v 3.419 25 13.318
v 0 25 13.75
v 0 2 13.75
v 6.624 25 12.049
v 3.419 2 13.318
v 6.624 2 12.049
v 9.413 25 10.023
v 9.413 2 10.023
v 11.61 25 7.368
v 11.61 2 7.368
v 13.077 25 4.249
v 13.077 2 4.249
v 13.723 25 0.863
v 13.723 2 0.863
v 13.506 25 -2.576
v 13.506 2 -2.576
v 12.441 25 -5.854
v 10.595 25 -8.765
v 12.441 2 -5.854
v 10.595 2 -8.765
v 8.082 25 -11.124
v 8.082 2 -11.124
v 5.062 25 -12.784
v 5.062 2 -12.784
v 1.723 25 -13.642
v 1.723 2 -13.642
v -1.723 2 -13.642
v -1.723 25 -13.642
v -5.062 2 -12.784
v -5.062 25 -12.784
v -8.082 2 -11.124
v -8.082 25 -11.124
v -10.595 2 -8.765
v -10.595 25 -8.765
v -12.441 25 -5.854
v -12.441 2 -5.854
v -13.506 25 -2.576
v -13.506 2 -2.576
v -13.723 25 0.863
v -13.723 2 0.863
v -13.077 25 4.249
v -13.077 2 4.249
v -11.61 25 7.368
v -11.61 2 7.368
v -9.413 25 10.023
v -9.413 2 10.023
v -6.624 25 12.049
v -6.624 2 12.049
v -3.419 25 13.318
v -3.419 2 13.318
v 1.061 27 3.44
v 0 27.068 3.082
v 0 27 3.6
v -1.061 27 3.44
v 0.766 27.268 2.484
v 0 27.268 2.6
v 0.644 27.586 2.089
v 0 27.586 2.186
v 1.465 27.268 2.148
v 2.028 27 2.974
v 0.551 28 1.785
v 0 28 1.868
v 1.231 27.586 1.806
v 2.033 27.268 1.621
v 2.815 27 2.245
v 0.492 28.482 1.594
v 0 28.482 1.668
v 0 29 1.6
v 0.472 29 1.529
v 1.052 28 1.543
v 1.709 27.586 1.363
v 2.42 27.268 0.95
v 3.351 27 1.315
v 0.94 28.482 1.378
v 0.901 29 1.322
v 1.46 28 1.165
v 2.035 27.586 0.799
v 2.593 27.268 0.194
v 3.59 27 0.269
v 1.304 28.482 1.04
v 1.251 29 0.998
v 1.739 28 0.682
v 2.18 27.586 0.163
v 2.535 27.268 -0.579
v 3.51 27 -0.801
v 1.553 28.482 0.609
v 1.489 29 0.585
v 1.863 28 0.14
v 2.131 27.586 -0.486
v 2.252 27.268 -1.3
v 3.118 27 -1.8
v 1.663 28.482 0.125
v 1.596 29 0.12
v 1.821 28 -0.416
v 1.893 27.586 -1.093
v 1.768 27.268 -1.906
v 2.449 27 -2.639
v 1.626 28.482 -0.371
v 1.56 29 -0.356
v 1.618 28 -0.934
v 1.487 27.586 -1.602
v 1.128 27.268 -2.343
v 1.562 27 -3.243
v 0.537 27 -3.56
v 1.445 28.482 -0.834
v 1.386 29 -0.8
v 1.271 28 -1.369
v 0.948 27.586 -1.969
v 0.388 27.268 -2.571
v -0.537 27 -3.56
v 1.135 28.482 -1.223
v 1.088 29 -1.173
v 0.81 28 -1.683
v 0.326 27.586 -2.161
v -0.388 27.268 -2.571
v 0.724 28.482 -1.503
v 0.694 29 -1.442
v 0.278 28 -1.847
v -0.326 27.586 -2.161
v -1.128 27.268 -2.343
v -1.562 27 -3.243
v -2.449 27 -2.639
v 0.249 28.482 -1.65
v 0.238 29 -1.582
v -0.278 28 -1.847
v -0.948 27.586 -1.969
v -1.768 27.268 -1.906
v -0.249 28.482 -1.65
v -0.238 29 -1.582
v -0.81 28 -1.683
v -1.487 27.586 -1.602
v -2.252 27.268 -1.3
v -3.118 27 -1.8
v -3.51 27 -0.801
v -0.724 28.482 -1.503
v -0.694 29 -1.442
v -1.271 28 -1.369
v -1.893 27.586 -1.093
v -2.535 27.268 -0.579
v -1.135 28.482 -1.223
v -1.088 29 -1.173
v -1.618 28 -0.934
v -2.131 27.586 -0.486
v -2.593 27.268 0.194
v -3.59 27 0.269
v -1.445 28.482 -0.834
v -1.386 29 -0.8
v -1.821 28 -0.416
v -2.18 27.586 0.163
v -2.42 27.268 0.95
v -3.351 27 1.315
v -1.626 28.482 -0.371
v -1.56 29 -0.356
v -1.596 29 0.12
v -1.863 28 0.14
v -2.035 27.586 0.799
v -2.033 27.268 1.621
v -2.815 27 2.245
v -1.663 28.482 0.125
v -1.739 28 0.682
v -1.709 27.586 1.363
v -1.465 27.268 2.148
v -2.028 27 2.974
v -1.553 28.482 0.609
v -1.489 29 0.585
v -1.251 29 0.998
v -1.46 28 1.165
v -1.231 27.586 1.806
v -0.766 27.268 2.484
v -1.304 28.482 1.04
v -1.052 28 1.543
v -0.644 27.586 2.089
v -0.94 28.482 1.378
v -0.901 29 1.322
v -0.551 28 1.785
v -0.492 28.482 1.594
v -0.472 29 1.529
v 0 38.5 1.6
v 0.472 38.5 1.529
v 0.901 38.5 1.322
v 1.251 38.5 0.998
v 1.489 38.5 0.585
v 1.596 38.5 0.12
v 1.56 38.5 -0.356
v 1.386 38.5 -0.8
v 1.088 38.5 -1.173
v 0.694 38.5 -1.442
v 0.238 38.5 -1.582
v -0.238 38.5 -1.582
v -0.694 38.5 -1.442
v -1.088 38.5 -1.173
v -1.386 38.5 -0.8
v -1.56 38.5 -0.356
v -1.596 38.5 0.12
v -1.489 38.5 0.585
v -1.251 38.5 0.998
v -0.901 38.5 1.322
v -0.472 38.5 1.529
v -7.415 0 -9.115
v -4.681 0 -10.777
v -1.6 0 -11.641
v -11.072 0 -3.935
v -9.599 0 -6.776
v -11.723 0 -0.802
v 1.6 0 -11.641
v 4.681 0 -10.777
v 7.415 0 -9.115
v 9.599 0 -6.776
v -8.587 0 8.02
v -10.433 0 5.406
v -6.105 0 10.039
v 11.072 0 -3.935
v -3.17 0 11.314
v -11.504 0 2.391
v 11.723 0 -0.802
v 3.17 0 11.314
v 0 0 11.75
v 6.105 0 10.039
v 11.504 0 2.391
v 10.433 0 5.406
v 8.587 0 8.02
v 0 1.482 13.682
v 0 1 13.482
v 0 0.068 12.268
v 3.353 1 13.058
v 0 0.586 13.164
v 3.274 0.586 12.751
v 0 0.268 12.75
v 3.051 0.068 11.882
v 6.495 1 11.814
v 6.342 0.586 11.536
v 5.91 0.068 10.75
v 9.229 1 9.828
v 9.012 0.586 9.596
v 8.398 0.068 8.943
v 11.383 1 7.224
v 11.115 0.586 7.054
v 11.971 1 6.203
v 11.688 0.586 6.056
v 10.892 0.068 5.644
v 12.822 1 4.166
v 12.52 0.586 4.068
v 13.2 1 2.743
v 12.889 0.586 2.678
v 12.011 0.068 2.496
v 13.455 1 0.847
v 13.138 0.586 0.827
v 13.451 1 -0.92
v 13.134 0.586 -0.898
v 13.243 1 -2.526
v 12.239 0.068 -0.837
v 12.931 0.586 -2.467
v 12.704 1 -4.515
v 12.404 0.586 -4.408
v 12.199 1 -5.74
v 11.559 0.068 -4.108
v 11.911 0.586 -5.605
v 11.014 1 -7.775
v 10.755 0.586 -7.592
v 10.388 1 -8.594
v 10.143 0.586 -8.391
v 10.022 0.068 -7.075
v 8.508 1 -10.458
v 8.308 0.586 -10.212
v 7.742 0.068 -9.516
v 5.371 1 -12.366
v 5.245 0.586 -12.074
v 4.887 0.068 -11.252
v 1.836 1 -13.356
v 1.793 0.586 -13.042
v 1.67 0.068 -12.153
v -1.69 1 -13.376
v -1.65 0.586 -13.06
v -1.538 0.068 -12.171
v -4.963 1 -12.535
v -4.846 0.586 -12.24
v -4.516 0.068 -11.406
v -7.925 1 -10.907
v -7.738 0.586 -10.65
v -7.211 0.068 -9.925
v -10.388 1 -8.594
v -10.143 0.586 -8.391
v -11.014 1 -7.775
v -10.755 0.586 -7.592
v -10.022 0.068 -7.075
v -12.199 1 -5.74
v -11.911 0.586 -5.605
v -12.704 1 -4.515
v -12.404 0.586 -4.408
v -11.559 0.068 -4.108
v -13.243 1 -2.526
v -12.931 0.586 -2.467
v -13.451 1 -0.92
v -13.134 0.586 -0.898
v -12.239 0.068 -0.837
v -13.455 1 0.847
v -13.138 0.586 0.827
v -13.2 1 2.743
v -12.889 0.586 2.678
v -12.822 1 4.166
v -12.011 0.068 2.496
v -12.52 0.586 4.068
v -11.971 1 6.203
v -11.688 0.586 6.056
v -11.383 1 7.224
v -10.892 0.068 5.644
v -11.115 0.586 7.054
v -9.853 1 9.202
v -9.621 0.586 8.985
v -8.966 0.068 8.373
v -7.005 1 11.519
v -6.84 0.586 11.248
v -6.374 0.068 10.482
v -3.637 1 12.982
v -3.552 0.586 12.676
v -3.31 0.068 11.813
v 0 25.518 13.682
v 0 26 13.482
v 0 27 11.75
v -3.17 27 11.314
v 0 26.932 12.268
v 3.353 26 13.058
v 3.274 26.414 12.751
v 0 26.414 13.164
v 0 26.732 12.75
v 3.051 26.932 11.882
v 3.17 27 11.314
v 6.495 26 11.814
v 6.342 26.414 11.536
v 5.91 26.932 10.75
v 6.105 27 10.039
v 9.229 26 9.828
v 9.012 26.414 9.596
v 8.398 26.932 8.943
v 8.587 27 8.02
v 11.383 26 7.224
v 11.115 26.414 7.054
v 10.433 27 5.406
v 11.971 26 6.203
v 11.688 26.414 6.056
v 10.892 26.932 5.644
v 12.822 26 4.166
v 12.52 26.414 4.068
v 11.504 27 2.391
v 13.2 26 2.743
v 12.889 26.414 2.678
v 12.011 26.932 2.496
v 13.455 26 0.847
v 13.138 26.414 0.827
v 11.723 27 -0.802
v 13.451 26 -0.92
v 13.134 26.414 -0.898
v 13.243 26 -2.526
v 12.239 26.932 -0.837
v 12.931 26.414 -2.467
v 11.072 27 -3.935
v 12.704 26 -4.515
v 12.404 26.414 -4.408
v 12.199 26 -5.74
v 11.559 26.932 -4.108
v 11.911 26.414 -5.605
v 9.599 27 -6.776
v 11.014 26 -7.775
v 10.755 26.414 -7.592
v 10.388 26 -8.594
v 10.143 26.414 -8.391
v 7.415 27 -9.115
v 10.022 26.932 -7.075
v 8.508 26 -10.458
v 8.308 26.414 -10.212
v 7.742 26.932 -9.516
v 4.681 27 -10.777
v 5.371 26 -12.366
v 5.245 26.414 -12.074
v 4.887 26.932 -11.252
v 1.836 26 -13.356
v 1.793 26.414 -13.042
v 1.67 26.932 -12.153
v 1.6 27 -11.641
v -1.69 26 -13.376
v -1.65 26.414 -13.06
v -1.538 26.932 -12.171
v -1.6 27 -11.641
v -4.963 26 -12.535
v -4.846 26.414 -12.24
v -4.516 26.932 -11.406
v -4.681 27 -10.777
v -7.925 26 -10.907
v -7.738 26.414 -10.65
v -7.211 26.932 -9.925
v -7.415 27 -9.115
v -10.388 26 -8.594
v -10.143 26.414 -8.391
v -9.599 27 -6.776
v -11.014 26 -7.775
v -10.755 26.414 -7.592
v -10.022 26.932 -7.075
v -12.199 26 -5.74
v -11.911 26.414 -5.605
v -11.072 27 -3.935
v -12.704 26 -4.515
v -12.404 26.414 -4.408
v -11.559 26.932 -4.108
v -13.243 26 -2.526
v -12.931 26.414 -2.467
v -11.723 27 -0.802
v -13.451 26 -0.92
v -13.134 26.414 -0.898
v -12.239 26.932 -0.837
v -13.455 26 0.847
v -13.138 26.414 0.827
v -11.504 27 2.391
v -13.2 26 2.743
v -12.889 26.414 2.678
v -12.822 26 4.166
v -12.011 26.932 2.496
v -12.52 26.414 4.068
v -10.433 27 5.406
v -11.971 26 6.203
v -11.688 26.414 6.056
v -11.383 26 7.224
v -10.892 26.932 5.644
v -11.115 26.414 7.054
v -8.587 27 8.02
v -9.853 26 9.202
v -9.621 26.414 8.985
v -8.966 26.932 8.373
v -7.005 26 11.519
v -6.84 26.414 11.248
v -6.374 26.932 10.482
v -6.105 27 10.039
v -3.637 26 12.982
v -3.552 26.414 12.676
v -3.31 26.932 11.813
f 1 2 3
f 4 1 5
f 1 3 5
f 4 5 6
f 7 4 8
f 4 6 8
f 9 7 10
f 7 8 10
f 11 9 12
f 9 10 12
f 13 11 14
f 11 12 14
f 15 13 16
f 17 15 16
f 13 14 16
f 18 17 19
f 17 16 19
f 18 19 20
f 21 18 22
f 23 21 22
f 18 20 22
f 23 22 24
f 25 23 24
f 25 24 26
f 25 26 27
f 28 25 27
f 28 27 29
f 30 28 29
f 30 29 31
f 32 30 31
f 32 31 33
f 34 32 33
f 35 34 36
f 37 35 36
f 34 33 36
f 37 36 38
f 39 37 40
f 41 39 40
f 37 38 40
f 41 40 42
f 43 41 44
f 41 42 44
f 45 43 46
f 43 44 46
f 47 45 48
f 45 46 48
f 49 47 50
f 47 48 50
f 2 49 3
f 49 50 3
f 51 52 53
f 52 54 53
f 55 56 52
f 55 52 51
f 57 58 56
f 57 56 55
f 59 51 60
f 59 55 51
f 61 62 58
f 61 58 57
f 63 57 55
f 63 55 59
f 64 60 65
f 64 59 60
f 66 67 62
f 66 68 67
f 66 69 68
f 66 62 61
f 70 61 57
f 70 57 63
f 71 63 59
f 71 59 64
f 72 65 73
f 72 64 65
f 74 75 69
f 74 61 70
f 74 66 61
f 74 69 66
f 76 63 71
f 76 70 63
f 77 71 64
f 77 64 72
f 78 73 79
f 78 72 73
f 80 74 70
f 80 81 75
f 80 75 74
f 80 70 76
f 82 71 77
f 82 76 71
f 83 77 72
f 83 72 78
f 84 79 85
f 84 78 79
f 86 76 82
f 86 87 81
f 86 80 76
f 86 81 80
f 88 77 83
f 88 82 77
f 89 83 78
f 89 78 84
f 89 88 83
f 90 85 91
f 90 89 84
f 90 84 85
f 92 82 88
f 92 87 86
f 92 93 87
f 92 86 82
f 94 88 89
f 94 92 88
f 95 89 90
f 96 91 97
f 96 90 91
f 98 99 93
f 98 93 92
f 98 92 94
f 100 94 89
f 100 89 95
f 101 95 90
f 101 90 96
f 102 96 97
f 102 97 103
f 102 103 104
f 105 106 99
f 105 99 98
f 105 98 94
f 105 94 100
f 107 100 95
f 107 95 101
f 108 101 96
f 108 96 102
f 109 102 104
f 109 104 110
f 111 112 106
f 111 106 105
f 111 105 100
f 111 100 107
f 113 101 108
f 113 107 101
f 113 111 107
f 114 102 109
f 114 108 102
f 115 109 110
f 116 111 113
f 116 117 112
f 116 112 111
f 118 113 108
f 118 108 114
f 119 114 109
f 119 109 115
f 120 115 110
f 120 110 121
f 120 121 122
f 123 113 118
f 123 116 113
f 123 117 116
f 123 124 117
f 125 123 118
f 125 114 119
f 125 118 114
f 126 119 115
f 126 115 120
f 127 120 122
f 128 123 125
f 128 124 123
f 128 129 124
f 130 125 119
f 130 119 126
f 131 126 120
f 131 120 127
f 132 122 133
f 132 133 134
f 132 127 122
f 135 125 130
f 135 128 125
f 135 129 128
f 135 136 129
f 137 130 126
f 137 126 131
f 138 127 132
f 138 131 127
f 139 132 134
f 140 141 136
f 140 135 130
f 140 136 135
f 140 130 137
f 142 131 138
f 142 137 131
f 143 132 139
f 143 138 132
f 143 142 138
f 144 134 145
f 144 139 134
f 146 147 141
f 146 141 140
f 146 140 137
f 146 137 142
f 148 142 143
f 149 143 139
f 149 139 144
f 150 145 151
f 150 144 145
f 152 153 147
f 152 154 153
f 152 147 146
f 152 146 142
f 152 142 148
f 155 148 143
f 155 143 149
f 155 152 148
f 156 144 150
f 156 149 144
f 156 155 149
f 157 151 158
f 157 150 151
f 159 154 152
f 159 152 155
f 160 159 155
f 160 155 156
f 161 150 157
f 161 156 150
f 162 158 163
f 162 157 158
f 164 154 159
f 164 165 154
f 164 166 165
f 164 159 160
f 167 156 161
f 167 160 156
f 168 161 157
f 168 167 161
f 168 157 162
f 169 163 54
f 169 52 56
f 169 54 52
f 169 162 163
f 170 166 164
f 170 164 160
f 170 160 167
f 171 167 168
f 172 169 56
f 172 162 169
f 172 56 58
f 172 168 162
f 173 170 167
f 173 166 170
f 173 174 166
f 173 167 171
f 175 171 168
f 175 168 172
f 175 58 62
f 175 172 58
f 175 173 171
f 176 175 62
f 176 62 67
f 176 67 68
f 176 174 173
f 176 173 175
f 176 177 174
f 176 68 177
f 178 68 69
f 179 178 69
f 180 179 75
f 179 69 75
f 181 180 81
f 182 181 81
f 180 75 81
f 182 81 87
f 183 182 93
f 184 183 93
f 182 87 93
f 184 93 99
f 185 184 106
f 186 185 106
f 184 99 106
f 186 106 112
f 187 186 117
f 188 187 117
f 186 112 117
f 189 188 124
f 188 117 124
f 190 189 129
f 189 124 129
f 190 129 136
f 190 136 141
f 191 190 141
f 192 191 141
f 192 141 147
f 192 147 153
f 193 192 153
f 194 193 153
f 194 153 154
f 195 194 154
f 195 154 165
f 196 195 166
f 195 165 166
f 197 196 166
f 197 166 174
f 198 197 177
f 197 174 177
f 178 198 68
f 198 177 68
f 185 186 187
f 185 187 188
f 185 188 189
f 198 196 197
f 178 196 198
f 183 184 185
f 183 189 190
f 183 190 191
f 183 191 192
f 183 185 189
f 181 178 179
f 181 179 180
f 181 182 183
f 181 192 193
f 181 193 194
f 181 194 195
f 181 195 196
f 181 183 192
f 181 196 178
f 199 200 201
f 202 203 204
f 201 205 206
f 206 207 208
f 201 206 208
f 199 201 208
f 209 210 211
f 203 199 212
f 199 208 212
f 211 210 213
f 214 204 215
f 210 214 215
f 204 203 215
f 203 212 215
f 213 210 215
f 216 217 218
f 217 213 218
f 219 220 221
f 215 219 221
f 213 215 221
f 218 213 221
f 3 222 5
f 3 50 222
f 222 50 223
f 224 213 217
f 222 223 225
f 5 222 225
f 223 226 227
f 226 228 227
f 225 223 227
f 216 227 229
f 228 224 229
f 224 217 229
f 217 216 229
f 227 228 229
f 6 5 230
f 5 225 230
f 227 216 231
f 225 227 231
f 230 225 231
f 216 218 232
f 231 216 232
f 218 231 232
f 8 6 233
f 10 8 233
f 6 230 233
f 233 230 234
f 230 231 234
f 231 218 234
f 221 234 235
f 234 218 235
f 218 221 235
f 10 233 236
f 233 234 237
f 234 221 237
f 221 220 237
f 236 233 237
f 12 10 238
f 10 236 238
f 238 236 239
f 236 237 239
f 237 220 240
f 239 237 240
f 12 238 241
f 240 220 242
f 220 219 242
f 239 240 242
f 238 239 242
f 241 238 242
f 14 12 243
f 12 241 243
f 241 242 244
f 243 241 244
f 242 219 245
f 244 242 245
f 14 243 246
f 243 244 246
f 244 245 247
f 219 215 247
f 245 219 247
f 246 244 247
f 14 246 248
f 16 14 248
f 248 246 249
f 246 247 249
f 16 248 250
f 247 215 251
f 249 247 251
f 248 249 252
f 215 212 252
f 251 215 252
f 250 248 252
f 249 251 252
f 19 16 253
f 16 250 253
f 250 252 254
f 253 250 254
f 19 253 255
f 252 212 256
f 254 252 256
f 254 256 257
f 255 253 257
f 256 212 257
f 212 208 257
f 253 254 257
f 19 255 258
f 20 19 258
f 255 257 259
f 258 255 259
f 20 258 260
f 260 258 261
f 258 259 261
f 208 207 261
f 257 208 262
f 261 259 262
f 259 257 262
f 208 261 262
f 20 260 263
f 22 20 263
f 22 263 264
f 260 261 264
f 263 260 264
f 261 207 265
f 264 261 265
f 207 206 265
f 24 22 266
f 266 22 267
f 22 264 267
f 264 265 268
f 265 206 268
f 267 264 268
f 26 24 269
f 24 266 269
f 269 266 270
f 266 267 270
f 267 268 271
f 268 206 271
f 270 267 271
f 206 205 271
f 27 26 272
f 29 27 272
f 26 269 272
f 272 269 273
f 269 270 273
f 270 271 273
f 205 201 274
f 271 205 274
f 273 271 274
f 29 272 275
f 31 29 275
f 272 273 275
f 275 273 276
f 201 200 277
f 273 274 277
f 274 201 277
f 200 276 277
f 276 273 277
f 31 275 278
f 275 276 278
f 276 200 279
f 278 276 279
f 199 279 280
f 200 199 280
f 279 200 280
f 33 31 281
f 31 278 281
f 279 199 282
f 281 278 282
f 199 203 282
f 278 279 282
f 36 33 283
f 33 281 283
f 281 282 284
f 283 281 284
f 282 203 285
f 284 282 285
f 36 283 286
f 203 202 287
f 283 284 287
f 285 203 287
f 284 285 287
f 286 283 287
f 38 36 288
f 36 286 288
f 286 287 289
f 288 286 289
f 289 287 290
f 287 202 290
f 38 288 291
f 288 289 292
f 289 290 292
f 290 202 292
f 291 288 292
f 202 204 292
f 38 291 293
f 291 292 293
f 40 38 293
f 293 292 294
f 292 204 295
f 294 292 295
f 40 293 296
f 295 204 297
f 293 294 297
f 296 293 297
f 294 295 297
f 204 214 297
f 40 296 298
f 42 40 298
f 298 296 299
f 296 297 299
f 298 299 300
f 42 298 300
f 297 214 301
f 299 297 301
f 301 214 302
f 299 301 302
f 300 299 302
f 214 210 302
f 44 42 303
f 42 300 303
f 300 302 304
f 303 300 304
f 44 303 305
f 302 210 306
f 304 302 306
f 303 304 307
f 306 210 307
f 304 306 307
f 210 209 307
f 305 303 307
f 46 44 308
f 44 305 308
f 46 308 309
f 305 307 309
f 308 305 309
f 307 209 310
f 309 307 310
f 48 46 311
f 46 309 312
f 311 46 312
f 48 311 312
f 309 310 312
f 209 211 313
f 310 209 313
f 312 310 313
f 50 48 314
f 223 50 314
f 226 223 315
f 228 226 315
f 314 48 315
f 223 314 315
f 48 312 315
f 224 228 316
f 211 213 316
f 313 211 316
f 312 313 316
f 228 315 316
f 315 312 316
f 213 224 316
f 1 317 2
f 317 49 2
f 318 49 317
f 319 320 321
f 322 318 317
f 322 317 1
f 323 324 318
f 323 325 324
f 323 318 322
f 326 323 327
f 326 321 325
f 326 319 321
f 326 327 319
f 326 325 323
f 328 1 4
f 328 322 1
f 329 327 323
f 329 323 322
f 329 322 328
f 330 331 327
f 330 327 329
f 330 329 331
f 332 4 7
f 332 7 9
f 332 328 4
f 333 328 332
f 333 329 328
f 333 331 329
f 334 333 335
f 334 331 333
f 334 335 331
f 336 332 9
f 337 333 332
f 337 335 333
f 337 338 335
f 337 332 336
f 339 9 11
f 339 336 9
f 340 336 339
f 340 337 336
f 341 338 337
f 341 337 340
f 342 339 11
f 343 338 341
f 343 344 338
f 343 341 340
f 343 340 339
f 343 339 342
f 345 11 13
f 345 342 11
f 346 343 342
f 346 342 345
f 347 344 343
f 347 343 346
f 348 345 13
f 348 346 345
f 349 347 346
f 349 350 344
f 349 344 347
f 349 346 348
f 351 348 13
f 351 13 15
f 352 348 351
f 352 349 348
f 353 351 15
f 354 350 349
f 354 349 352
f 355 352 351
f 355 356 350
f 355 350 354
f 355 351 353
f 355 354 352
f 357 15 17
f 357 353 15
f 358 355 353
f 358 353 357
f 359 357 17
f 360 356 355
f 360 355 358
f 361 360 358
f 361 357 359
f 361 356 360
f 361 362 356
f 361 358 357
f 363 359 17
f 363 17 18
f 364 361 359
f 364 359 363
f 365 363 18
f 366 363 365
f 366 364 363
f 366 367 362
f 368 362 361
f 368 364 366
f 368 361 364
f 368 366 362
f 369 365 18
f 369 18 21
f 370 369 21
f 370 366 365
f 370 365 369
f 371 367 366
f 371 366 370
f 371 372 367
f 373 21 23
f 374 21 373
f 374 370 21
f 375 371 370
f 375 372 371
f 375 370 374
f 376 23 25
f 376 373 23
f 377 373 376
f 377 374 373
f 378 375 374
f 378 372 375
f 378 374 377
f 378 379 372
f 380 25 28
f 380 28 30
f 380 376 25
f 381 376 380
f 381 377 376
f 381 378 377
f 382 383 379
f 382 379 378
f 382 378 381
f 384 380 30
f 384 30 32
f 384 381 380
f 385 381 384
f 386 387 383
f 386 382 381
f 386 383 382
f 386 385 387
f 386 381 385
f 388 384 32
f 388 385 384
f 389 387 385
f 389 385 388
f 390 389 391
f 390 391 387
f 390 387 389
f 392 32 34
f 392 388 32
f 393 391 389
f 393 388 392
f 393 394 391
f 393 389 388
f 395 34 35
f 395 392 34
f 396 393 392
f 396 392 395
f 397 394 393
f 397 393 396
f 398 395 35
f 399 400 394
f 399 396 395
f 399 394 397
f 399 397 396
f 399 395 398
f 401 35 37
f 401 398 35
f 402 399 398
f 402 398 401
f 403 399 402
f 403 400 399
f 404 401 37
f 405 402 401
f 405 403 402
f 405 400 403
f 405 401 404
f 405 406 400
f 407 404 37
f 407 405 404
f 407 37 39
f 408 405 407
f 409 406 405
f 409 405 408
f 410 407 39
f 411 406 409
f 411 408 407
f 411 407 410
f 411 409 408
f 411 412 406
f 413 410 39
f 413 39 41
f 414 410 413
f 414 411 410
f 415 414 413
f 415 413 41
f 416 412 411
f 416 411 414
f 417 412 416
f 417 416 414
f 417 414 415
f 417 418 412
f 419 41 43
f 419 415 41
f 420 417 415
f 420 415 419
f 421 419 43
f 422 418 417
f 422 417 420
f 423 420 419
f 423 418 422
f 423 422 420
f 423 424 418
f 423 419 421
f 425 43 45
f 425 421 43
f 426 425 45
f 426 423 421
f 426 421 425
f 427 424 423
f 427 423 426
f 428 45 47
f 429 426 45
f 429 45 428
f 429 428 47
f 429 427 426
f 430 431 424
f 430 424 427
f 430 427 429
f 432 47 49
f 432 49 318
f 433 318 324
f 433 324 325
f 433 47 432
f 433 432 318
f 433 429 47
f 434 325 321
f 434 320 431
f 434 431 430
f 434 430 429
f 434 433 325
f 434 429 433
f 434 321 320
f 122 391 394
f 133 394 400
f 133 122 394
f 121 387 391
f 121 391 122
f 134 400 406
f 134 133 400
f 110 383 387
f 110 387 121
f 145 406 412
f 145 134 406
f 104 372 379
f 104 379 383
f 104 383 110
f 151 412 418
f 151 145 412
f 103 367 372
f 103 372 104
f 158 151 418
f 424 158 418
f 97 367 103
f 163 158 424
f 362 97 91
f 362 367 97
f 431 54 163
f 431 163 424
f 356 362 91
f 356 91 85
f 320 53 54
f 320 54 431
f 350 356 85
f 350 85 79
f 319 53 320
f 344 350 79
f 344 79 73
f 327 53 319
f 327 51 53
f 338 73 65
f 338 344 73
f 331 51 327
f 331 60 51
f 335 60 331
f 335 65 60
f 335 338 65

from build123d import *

# Parameters (mm, degrees)
CROQUIS1_R              = 13.75
SALIENTE_EXTRUIR1_DEPTH = 27
CROQUIS3_R              = 1.6
SALIENTE_EXTRUIR2_DEPTH = 11.5
REDONDEO1_R             = 2


with BuildPart() as part:
    # Croquis1 → Saliente-Extruir1 (new body)
    with BuildSketch(Plane(origin=(0, 0, 0), x_dir=(1, 0, 0), z_dir=(0, 1, 0))):
        with Locations(Location((0, 0, 0), (0, 0, 270))):
            Circle(CROQUIS1_R)
    extrude(amount=SALIENTE_EXTRUIR1_DEPTH)

    # Croquis3 → Saliente-Extruir2 (add)
    with BuildSketch(Plane(origin=(0, 27, 0), x_dir=(1, 0, 0), z_dir=(0, 1, 0))):
        with Locations(Location((0, 0, 0), (0, 0, 270))):
            Circle(CROQUIS3_R)
    extrude(amount=SALIENTE_EXTRUIR2_DEPTH)

    # Redondeo1
    redondeo1_edges = [part.edges().sort_by_distance(p)[0] for p in [
        (0, 0, -13.75),
        (0, 27, -13.75),
        (0, 27, -1.6),
    ]]
    fillet(redondeo1_edges, radius=REDONDEO1_R)


solid = part.part
